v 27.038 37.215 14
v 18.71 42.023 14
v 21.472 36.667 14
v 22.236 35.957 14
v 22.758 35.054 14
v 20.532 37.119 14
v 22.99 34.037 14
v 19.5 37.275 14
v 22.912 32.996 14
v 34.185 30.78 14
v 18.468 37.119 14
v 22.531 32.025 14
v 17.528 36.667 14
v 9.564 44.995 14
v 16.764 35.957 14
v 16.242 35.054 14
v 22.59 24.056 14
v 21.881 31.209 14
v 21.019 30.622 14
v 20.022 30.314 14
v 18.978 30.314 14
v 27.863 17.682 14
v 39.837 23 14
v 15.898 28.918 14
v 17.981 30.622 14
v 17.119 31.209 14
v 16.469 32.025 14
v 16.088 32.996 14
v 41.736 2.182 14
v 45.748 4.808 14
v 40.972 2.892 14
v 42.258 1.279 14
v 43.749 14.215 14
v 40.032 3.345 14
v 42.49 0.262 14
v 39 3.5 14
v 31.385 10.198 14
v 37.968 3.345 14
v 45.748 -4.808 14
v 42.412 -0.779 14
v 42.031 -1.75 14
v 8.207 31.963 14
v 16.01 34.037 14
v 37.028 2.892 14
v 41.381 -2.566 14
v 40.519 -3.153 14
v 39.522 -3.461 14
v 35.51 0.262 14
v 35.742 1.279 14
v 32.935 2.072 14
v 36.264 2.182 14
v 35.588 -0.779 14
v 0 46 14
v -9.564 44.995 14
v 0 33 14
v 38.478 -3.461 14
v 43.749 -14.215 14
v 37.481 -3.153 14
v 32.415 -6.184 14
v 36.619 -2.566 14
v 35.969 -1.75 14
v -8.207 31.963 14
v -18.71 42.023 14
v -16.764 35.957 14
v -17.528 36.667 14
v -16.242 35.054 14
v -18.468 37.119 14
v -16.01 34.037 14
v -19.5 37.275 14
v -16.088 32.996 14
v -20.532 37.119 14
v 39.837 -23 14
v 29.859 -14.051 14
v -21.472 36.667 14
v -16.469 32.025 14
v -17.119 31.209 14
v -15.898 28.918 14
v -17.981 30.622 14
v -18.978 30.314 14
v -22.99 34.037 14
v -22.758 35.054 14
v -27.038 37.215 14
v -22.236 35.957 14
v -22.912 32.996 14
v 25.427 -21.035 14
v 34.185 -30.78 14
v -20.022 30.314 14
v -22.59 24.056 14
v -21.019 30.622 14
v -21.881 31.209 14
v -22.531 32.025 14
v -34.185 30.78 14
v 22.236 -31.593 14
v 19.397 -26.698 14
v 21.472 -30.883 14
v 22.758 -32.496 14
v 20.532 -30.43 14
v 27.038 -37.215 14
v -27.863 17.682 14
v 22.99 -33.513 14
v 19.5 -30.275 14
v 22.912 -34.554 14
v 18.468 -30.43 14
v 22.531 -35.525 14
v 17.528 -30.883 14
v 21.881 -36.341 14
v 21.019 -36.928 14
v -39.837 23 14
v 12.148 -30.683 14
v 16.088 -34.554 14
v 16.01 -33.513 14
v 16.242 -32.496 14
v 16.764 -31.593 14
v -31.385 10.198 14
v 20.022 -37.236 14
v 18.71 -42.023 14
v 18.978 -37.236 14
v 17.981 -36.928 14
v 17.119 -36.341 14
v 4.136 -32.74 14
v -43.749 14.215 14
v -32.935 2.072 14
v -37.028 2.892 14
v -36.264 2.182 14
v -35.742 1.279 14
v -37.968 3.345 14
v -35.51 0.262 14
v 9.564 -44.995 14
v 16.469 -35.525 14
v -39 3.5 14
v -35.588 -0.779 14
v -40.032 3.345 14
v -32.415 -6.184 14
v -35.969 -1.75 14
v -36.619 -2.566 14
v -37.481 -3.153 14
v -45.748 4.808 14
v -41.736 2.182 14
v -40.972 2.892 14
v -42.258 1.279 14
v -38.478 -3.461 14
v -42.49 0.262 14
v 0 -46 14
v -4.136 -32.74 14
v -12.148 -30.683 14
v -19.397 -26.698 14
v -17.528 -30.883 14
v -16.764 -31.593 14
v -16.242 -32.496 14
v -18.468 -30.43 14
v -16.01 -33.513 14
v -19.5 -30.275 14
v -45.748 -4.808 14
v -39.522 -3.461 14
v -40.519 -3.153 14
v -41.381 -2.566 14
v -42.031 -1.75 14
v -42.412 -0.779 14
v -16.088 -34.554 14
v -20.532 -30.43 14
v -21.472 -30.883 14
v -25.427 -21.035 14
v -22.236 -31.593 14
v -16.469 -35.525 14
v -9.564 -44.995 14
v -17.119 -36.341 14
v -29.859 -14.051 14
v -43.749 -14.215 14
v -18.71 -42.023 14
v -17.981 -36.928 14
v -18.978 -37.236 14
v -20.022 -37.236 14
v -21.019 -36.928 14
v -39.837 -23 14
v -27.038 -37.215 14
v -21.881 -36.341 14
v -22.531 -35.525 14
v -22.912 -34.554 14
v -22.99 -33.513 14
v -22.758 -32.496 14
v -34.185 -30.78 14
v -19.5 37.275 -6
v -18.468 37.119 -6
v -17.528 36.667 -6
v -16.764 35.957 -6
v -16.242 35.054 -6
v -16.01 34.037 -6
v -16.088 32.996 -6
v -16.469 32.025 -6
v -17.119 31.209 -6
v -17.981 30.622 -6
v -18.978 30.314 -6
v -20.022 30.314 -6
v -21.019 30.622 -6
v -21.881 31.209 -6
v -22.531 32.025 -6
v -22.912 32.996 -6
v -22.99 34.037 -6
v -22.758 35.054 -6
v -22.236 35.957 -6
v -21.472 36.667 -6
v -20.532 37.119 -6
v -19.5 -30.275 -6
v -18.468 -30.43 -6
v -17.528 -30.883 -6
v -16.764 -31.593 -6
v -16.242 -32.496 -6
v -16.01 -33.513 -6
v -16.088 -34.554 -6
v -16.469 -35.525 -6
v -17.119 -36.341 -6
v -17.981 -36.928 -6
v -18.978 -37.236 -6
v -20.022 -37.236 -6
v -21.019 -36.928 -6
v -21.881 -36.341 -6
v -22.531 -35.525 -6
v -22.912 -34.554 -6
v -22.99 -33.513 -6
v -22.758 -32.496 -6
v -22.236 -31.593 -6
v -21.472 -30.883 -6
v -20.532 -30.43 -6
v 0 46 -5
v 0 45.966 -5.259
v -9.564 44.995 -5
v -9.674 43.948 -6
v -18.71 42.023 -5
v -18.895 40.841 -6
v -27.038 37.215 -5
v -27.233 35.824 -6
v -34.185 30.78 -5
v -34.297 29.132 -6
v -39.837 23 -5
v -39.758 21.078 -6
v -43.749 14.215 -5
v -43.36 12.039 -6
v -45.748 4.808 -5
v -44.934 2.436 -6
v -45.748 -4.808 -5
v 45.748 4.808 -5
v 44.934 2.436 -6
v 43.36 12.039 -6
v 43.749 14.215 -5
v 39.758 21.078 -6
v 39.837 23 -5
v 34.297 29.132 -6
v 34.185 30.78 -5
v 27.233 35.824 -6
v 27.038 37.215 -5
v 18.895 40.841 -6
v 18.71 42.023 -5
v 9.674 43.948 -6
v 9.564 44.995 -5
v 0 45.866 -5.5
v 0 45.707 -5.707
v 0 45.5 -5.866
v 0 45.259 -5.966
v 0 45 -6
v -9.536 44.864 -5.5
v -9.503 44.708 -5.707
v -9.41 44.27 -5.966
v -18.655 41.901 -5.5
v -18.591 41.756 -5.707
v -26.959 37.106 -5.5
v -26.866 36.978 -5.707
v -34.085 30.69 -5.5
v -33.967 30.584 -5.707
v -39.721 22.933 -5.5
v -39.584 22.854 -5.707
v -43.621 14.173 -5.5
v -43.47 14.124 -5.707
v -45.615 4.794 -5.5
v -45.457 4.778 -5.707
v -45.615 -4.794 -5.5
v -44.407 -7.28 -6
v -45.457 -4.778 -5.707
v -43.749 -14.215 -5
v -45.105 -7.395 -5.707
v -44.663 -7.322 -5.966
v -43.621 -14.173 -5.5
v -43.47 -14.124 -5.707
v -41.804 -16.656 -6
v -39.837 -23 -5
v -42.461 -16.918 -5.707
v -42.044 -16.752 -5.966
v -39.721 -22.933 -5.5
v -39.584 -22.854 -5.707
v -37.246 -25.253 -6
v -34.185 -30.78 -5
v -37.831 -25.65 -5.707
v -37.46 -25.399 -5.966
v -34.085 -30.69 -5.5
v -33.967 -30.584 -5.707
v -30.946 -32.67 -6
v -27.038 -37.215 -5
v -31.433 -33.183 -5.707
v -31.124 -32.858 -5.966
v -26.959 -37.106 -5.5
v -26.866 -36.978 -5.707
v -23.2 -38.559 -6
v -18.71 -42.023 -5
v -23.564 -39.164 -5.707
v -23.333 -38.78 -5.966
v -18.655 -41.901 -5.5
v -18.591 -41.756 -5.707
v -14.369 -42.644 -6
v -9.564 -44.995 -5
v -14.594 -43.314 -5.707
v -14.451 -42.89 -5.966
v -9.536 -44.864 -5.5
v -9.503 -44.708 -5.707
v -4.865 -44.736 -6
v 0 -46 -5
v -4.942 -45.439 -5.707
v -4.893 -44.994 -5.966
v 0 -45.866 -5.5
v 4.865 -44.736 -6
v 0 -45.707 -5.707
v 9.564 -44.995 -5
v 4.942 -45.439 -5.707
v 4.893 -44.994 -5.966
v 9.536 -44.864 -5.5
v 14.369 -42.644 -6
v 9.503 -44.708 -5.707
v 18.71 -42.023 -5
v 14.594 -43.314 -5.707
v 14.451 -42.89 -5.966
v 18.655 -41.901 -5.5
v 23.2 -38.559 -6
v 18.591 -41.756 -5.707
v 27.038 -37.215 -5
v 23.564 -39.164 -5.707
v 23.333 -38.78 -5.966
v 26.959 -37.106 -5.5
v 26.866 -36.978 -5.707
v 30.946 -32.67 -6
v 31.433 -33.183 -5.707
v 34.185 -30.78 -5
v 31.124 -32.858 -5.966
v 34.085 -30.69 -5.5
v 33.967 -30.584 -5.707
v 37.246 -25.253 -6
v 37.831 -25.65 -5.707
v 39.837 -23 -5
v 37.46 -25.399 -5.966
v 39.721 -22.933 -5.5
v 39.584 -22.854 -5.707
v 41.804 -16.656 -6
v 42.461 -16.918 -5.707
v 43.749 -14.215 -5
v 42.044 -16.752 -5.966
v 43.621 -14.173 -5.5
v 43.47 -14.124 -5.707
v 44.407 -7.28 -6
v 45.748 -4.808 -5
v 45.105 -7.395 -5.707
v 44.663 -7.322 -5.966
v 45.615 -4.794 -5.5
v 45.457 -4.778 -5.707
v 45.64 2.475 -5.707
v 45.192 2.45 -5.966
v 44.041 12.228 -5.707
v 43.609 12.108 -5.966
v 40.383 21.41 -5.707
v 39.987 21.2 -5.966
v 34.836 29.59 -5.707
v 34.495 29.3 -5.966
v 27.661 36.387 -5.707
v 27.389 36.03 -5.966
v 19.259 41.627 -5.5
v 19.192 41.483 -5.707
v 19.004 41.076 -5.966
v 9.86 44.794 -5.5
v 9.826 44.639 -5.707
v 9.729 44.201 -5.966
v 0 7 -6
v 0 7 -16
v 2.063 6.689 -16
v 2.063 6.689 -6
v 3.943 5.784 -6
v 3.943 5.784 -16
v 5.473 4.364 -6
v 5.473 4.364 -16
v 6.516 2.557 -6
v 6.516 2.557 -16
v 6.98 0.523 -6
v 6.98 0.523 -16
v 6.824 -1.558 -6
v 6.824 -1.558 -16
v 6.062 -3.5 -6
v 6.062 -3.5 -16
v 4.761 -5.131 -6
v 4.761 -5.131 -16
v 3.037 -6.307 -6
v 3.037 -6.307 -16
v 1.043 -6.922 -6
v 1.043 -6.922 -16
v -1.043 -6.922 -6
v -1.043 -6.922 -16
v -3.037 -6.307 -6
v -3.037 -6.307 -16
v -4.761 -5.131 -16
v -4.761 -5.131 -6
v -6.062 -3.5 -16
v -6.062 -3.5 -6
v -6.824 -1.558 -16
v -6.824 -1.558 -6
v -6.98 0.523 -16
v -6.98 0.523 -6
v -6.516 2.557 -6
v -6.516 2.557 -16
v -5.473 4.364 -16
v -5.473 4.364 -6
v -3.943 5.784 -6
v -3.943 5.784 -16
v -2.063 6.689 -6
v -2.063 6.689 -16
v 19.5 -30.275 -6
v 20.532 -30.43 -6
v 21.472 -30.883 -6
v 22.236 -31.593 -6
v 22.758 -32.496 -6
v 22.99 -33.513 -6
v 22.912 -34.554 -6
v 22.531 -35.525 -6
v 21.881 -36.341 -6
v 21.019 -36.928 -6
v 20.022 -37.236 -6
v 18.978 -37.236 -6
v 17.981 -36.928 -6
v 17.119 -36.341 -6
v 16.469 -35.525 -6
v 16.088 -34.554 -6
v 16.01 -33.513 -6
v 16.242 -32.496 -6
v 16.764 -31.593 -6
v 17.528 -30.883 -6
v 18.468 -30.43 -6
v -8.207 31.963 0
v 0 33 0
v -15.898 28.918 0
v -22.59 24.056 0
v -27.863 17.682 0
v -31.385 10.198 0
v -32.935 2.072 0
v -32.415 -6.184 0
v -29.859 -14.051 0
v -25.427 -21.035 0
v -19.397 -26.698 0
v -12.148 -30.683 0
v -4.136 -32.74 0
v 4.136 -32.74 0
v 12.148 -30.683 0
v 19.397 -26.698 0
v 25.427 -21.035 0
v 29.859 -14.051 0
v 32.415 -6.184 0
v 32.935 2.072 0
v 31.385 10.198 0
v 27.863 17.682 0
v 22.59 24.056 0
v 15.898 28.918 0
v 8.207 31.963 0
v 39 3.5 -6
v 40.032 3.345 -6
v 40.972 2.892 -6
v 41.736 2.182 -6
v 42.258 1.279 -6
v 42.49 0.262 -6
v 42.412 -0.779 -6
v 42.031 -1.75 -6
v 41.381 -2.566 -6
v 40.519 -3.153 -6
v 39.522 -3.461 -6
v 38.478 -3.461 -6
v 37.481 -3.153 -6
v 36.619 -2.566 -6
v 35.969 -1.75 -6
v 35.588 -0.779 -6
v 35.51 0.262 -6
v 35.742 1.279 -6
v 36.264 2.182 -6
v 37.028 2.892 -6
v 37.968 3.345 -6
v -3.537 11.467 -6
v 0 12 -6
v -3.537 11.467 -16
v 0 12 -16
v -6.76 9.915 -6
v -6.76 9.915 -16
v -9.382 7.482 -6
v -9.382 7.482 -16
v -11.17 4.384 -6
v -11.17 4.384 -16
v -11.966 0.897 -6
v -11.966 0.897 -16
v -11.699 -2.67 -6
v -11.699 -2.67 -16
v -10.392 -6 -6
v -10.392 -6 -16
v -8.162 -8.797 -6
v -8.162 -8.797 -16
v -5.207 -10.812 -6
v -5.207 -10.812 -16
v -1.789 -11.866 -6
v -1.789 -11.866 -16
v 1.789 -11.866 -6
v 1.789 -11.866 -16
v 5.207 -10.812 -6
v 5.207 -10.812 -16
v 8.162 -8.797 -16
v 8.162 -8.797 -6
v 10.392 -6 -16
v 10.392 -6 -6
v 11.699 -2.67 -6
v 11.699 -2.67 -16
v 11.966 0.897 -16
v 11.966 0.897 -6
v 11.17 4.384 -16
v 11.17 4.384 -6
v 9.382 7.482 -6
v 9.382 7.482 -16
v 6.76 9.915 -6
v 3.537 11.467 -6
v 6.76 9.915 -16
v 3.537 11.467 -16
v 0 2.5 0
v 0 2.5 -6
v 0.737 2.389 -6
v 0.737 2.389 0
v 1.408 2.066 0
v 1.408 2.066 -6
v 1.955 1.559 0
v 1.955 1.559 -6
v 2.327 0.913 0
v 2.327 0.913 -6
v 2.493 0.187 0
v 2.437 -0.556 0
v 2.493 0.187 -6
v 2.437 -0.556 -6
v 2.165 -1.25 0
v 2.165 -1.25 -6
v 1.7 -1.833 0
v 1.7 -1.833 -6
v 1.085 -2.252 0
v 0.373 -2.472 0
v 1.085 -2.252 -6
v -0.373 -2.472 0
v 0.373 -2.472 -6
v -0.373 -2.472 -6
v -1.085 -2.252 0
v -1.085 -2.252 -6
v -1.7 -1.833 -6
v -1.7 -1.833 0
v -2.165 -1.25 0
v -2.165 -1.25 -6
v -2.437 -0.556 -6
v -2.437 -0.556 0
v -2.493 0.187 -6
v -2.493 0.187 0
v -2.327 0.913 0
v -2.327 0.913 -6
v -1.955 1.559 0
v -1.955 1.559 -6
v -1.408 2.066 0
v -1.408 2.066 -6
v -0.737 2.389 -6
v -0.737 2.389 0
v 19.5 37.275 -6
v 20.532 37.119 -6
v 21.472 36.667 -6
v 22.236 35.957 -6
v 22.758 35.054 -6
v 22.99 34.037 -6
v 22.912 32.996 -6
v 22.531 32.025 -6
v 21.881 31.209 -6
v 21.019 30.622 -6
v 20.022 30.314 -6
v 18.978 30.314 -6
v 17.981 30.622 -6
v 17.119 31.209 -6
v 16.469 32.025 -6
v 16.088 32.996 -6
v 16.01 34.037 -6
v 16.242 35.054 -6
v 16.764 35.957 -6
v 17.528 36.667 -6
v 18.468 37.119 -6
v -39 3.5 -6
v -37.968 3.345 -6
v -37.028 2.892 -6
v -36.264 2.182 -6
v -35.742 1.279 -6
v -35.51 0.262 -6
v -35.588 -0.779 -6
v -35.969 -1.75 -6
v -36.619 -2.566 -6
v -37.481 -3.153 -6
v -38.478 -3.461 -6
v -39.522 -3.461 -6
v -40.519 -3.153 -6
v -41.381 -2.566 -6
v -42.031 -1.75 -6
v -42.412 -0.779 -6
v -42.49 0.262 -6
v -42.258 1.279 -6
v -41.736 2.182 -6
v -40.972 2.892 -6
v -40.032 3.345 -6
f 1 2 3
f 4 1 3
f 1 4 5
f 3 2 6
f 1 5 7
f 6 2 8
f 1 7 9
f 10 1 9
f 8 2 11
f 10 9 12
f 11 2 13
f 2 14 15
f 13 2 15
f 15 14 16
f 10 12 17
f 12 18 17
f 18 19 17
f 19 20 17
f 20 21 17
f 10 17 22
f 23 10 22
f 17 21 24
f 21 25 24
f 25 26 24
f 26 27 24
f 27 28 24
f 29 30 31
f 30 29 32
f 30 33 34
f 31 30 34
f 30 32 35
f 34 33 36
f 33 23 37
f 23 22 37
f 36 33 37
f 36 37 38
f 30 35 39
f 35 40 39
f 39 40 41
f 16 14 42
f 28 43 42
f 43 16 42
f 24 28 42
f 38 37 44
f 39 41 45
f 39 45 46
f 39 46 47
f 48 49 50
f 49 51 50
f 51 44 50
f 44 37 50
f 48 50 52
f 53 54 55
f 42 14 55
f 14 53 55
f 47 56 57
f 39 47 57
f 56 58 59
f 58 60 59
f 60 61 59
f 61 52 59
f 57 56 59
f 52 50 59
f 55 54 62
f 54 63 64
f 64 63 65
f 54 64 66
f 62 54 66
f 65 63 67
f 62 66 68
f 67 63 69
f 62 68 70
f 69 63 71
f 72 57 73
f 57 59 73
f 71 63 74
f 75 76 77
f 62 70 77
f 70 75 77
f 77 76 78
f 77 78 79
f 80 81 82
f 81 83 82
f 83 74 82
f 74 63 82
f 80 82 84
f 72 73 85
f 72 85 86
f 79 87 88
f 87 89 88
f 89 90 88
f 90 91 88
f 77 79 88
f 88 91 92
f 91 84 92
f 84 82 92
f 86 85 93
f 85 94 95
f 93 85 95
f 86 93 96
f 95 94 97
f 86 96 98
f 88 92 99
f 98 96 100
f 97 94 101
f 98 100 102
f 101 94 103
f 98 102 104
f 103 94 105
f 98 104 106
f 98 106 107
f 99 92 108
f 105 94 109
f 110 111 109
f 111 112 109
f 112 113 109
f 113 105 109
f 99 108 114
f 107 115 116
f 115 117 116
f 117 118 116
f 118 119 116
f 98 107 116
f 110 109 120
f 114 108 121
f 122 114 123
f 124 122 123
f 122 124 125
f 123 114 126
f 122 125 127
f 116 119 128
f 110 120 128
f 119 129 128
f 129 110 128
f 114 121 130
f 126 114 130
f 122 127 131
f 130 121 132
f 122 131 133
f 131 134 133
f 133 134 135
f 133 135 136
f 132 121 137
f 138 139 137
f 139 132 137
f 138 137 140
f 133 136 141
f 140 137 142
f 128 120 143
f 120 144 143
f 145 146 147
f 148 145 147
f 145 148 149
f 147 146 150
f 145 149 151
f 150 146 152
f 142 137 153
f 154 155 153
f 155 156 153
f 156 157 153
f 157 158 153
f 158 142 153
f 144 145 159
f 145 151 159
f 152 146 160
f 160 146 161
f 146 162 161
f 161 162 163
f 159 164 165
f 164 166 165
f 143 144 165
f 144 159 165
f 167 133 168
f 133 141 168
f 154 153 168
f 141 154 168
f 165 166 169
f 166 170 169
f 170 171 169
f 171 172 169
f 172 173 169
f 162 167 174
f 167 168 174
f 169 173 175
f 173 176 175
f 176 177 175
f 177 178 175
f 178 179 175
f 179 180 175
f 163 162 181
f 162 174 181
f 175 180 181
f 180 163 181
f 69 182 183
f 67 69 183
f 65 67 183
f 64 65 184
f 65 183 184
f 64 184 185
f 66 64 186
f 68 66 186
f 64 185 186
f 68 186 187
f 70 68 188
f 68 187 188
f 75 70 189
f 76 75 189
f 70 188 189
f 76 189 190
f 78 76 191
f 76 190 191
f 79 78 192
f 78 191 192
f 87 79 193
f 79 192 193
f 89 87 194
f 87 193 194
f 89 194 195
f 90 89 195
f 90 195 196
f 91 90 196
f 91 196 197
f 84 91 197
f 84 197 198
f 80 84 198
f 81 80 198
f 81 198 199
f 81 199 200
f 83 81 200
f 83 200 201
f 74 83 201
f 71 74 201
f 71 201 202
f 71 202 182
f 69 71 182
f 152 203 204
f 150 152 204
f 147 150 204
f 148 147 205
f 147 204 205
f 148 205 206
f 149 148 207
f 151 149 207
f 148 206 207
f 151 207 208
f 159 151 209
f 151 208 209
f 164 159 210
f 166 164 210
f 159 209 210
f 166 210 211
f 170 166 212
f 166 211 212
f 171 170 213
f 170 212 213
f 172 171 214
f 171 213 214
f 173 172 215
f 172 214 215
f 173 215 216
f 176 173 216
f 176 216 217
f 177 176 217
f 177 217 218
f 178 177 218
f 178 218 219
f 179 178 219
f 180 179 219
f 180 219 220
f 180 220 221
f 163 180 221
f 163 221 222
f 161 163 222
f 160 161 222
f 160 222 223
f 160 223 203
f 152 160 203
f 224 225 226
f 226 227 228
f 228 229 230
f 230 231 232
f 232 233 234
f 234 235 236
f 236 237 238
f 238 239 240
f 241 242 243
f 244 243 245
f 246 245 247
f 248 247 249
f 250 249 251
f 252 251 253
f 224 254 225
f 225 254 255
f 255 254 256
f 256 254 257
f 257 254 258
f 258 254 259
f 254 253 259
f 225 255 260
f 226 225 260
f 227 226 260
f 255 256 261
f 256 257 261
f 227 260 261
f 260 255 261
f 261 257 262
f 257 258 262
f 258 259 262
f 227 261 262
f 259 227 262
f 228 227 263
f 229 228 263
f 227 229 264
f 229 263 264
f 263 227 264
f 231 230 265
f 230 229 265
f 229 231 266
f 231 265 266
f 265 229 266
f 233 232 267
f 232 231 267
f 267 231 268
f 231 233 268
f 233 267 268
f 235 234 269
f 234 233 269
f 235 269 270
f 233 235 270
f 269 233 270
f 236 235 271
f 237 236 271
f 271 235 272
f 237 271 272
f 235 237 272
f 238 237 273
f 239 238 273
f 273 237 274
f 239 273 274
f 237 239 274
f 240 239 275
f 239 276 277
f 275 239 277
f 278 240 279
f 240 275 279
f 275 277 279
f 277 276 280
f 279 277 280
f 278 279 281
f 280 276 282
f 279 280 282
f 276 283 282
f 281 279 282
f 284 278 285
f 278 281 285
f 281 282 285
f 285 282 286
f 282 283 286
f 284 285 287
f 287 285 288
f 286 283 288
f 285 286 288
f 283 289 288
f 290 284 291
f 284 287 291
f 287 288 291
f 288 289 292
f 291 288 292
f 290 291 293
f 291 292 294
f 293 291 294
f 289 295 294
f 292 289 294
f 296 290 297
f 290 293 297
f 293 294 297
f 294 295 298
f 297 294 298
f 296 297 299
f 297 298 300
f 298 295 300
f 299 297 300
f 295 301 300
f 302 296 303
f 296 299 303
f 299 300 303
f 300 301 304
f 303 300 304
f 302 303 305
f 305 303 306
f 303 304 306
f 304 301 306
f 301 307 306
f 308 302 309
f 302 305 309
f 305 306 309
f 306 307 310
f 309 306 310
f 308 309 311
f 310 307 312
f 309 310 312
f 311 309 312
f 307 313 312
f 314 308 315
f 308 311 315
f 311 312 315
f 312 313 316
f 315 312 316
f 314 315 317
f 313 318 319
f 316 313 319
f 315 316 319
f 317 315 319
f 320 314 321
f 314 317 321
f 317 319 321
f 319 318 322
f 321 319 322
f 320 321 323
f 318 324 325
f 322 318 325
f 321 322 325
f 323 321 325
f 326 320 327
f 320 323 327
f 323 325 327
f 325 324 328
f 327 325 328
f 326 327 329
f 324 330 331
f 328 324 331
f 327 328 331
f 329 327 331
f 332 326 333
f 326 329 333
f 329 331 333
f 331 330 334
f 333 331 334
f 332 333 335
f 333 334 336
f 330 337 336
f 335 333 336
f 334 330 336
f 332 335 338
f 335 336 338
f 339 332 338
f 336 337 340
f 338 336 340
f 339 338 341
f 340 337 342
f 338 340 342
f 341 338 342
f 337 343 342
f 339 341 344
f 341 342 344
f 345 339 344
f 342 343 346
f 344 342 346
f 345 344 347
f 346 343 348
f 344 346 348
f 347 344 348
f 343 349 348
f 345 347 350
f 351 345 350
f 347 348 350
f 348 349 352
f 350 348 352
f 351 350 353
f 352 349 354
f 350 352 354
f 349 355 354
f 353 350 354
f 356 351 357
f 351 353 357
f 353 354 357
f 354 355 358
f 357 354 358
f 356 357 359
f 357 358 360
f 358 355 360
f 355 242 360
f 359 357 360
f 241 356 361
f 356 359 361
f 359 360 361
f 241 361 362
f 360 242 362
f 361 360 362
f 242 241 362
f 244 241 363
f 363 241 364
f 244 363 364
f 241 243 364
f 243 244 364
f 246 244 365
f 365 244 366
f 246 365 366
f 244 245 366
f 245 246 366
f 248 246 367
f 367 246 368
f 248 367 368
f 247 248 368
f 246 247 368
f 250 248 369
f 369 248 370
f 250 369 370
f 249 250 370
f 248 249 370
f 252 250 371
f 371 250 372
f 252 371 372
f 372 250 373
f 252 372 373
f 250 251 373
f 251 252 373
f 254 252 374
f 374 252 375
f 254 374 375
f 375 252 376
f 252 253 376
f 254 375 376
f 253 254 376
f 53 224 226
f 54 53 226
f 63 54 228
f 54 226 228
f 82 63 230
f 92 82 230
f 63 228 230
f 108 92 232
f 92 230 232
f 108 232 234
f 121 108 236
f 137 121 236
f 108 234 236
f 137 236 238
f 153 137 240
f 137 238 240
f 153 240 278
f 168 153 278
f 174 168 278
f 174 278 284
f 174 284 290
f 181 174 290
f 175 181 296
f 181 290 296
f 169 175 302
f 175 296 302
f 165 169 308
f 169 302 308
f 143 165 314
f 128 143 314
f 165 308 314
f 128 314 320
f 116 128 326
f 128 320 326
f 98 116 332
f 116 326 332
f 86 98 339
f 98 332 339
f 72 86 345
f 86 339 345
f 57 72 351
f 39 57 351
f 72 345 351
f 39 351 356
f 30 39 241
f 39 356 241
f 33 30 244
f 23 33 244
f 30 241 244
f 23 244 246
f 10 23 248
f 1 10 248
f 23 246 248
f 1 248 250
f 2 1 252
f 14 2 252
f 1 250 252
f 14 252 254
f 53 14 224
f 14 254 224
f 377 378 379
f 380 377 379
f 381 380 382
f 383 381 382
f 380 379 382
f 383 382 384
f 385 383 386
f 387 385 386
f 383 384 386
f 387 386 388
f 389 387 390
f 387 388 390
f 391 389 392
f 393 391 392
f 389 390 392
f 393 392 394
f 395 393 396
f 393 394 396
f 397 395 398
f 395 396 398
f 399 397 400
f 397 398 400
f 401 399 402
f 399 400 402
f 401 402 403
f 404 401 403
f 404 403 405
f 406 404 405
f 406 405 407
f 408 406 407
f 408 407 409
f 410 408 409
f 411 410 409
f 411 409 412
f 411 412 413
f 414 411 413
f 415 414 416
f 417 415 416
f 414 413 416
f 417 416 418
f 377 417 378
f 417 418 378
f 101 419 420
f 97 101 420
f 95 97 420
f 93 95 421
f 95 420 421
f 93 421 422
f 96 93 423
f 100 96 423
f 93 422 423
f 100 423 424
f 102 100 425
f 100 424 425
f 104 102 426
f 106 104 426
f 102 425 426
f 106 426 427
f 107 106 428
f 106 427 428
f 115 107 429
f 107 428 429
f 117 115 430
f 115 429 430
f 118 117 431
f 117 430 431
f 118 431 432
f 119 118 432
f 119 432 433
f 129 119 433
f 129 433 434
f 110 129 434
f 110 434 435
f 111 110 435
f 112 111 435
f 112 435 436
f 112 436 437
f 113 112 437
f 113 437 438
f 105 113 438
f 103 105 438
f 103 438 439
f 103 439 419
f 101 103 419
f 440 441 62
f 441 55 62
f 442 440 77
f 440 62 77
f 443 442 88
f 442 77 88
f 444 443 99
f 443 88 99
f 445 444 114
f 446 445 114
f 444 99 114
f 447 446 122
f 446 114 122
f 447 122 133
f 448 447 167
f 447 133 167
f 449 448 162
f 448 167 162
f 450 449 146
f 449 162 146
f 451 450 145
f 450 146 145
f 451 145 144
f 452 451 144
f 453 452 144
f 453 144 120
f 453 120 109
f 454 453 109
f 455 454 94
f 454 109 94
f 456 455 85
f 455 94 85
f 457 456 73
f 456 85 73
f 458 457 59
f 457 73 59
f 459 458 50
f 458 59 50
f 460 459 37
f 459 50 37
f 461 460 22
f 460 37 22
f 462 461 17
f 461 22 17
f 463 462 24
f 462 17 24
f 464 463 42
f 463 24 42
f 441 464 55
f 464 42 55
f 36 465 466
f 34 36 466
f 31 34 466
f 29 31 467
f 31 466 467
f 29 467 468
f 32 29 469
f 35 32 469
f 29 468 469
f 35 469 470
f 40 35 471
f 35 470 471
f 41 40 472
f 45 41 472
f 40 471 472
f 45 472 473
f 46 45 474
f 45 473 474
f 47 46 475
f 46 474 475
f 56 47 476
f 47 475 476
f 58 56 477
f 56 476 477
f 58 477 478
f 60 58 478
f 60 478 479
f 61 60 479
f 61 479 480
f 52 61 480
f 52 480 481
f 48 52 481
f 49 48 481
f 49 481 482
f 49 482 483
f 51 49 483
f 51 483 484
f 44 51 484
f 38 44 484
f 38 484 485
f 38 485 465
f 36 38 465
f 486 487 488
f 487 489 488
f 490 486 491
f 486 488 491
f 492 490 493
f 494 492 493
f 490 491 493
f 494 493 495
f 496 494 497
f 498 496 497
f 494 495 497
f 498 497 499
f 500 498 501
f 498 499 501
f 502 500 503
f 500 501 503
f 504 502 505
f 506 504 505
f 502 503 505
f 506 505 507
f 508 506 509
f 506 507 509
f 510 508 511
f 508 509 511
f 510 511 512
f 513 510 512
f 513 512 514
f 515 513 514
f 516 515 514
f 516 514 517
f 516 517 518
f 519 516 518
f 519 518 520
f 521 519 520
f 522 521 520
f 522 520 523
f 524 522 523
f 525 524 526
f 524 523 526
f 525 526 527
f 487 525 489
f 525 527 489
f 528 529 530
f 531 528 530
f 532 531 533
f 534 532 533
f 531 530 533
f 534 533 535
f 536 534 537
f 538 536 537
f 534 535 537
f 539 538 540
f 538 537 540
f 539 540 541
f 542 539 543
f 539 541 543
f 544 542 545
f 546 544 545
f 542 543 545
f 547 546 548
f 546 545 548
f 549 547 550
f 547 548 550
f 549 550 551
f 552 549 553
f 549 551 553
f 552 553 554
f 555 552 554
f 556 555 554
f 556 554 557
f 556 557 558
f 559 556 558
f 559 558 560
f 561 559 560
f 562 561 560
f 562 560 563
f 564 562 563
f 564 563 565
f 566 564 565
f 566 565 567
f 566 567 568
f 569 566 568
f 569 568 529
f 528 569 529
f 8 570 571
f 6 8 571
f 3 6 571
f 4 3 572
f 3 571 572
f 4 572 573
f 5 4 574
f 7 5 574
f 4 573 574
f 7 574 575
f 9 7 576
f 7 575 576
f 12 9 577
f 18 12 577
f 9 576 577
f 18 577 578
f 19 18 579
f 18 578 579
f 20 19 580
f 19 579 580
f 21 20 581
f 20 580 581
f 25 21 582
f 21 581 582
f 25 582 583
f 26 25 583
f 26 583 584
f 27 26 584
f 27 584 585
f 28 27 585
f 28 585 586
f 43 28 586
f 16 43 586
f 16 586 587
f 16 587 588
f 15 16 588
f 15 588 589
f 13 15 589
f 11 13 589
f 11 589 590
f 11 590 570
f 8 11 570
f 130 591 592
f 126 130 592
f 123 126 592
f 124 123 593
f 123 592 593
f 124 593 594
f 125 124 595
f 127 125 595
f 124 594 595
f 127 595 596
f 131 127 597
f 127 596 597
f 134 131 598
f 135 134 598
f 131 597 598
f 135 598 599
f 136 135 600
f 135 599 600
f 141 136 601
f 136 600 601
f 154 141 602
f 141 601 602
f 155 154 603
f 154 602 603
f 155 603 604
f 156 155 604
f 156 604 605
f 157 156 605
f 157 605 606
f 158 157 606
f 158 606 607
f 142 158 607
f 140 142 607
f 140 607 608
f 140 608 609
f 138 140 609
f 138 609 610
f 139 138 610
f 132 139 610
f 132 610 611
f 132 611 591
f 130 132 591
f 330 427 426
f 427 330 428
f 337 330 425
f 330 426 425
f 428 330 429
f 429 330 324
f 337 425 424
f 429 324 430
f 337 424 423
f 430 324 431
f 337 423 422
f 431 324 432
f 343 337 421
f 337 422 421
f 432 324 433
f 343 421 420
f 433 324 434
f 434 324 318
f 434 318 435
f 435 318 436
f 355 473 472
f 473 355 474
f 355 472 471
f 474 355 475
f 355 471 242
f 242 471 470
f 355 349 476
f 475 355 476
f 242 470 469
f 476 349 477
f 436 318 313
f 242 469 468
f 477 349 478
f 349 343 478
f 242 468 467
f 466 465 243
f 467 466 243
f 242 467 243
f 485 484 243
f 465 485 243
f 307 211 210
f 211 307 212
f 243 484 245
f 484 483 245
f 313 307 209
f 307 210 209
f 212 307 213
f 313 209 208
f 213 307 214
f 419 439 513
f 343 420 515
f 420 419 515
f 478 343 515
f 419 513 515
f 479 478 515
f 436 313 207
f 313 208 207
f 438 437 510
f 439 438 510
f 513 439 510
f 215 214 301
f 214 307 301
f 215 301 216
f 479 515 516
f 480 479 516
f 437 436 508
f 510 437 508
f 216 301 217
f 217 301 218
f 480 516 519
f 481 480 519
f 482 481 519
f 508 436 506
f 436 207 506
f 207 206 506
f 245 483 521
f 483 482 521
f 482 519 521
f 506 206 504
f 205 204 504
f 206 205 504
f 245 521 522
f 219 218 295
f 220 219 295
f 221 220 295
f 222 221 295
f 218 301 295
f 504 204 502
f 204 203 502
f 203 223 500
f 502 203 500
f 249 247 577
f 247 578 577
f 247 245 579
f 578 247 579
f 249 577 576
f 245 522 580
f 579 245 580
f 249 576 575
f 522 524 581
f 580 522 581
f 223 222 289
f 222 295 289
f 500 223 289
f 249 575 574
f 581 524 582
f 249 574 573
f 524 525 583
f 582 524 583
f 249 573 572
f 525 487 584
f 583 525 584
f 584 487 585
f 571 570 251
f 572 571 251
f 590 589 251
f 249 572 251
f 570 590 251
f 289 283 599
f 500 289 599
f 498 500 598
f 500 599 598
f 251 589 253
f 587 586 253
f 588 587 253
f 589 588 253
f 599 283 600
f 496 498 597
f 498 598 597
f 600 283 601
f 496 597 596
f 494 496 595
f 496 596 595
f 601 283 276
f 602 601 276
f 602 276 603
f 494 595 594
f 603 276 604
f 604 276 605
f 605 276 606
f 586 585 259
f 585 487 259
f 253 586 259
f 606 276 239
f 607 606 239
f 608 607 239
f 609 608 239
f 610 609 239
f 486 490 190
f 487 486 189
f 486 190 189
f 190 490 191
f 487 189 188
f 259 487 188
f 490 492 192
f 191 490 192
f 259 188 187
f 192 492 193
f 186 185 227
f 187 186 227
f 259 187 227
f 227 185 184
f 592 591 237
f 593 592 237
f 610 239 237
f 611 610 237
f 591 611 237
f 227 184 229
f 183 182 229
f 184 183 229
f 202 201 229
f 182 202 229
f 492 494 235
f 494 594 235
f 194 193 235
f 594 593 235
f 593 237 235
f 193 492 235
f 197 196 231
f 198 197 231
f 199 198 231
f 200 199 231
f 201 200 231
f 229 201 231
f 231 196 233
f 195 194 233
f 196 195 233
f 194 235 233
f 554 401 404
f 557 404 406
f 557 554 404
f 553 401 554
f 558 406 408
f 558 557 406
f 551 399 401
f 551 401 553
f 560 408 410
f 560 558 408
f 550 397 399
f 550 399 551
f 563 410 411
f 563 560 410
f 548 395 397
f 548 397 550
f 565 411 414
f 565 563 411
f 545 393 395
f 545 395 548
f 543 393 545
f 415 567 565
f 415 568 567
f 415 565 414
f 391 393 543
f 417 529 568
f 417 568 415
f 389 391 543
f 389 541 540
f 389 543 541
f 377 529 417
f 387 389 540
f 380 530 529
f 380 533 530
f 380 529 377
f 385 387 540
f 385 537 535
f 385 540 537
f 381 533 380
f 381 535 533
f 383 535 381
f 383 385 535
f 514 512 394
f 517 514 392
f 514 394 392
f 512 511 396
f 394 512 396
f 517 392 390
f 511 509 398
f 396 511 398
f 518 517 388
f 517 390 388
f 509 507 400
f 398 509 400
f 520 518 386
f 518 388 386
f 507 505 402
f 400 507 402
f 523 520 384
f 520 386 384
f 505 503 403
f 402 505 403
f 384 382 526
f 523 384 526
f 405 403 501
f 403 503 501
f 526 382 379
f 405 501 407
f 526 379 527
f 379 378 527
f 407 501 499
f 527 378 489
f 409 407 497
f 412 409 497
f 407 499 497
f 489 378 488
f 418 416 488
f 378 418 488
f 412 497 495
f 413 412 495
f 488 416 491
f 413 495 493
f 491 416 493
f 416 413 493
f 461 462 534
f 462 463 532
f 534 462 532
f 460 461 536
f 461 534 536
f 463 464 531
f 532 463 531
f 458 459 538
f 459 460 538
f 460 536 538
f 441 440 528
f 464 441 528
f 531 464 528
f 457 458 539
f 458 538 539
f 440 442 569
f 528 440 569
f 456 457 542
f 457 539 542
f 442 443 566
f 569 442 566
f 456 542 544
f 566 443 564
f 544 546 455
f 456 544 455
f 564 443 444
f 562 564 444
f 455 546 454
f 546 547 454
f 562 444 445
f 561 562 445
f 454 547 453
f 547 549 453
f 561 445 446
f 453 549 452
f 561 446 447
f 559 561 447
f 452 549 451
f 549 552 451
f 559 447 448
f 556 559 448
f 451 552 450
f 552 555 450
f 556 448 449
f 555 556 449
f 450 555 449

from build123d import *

# Parameters (mm, degrees)
SKETCH2_R          = 3.5
CUT_EXTRUDE1_DEPTH = 69.058798109
SKETCH3_R          = 7
CUT_EXTRUDE2_DEPTH = 10
SKETCH3_3_R        = 2.5
CUT_EXTRUDE3_DEPTH = 72.637978754
FILLET1_R          = 1


with BuildPart() as part:
    # Sketch1 → Revolve1 (revolve)
    with BuildSketch(Plane(origin=(0, 0, 0), x_dir=(0, 0, -1), z_dir=(1, 0, 0))):
        Polygon((0, 33), (-14, 33), (-14, 46), (6, 46), (6, 12), (16, 12), (16, 0), (0, 0), align=None)
    revolve(axis=Axis((0, 0, -16), (0, 0, 1)))

    # Sketch2 → Cut-Extrude1 (cut, through all)
    with BuildSketch(Plane(origin=(0, 0, -6), x_dir=(-1, 0, 0), z_dir=(0, 0, -1))):
        with Locations((19.5, -33.774990748)):
            Circle(SKETCH2_R)
        with Locations((-19.5, -33.774990748)):
            Circle(SKETCH2_R)
        with Locations((-39, 0)):
            Circle(SKETCH2_R)
        with Locations((-19.5, 33.774990748)):
            Circle(SKETCH2_R)
        with Locations((19.5, 33.774990748)):
            Circle(SKETCH2_R)
        with Locations((39, 0)):
            Circle(SKETCH2_R)
    extrude(amount=-CUT_EXTRUDE1_DEPTH, mode=Mode.SUBTRACT)

    # Sketch3 → Cut-Extrude2 (cut)
    with BuildSketch(Plane(origin=(0, 0, -16), x_dir=(-1, 0, 0), z_dir=(0, 0, -1))):
        Circle(SKETCH3_R)
    extrude(amount=-CUT_EXTRUDE2_DEPTH, mode=Mode.SUBTRACT)

    # Sketch3<3> → Cut-Extrude3 (cut, through all)
    with BuildSketch(Plane(origin=(0, 0, -16), x_dir=(-1, 0, 0), z_dir=(0, 0, -1))):
        Circle(SKETCH3_3_R)
    extrude(amount=-CUT_EXTRUDE3_DEPTH, mode=Mode.SUBTRACT)

    # Fillet1
    fillet1_edges = [part.edges().sort_by_distance(p)[0] for p in [
        (0, -46, -6),
    ]]
    fillet(fillet1_edges, radius=FILLET1_R)


solid = part.part
